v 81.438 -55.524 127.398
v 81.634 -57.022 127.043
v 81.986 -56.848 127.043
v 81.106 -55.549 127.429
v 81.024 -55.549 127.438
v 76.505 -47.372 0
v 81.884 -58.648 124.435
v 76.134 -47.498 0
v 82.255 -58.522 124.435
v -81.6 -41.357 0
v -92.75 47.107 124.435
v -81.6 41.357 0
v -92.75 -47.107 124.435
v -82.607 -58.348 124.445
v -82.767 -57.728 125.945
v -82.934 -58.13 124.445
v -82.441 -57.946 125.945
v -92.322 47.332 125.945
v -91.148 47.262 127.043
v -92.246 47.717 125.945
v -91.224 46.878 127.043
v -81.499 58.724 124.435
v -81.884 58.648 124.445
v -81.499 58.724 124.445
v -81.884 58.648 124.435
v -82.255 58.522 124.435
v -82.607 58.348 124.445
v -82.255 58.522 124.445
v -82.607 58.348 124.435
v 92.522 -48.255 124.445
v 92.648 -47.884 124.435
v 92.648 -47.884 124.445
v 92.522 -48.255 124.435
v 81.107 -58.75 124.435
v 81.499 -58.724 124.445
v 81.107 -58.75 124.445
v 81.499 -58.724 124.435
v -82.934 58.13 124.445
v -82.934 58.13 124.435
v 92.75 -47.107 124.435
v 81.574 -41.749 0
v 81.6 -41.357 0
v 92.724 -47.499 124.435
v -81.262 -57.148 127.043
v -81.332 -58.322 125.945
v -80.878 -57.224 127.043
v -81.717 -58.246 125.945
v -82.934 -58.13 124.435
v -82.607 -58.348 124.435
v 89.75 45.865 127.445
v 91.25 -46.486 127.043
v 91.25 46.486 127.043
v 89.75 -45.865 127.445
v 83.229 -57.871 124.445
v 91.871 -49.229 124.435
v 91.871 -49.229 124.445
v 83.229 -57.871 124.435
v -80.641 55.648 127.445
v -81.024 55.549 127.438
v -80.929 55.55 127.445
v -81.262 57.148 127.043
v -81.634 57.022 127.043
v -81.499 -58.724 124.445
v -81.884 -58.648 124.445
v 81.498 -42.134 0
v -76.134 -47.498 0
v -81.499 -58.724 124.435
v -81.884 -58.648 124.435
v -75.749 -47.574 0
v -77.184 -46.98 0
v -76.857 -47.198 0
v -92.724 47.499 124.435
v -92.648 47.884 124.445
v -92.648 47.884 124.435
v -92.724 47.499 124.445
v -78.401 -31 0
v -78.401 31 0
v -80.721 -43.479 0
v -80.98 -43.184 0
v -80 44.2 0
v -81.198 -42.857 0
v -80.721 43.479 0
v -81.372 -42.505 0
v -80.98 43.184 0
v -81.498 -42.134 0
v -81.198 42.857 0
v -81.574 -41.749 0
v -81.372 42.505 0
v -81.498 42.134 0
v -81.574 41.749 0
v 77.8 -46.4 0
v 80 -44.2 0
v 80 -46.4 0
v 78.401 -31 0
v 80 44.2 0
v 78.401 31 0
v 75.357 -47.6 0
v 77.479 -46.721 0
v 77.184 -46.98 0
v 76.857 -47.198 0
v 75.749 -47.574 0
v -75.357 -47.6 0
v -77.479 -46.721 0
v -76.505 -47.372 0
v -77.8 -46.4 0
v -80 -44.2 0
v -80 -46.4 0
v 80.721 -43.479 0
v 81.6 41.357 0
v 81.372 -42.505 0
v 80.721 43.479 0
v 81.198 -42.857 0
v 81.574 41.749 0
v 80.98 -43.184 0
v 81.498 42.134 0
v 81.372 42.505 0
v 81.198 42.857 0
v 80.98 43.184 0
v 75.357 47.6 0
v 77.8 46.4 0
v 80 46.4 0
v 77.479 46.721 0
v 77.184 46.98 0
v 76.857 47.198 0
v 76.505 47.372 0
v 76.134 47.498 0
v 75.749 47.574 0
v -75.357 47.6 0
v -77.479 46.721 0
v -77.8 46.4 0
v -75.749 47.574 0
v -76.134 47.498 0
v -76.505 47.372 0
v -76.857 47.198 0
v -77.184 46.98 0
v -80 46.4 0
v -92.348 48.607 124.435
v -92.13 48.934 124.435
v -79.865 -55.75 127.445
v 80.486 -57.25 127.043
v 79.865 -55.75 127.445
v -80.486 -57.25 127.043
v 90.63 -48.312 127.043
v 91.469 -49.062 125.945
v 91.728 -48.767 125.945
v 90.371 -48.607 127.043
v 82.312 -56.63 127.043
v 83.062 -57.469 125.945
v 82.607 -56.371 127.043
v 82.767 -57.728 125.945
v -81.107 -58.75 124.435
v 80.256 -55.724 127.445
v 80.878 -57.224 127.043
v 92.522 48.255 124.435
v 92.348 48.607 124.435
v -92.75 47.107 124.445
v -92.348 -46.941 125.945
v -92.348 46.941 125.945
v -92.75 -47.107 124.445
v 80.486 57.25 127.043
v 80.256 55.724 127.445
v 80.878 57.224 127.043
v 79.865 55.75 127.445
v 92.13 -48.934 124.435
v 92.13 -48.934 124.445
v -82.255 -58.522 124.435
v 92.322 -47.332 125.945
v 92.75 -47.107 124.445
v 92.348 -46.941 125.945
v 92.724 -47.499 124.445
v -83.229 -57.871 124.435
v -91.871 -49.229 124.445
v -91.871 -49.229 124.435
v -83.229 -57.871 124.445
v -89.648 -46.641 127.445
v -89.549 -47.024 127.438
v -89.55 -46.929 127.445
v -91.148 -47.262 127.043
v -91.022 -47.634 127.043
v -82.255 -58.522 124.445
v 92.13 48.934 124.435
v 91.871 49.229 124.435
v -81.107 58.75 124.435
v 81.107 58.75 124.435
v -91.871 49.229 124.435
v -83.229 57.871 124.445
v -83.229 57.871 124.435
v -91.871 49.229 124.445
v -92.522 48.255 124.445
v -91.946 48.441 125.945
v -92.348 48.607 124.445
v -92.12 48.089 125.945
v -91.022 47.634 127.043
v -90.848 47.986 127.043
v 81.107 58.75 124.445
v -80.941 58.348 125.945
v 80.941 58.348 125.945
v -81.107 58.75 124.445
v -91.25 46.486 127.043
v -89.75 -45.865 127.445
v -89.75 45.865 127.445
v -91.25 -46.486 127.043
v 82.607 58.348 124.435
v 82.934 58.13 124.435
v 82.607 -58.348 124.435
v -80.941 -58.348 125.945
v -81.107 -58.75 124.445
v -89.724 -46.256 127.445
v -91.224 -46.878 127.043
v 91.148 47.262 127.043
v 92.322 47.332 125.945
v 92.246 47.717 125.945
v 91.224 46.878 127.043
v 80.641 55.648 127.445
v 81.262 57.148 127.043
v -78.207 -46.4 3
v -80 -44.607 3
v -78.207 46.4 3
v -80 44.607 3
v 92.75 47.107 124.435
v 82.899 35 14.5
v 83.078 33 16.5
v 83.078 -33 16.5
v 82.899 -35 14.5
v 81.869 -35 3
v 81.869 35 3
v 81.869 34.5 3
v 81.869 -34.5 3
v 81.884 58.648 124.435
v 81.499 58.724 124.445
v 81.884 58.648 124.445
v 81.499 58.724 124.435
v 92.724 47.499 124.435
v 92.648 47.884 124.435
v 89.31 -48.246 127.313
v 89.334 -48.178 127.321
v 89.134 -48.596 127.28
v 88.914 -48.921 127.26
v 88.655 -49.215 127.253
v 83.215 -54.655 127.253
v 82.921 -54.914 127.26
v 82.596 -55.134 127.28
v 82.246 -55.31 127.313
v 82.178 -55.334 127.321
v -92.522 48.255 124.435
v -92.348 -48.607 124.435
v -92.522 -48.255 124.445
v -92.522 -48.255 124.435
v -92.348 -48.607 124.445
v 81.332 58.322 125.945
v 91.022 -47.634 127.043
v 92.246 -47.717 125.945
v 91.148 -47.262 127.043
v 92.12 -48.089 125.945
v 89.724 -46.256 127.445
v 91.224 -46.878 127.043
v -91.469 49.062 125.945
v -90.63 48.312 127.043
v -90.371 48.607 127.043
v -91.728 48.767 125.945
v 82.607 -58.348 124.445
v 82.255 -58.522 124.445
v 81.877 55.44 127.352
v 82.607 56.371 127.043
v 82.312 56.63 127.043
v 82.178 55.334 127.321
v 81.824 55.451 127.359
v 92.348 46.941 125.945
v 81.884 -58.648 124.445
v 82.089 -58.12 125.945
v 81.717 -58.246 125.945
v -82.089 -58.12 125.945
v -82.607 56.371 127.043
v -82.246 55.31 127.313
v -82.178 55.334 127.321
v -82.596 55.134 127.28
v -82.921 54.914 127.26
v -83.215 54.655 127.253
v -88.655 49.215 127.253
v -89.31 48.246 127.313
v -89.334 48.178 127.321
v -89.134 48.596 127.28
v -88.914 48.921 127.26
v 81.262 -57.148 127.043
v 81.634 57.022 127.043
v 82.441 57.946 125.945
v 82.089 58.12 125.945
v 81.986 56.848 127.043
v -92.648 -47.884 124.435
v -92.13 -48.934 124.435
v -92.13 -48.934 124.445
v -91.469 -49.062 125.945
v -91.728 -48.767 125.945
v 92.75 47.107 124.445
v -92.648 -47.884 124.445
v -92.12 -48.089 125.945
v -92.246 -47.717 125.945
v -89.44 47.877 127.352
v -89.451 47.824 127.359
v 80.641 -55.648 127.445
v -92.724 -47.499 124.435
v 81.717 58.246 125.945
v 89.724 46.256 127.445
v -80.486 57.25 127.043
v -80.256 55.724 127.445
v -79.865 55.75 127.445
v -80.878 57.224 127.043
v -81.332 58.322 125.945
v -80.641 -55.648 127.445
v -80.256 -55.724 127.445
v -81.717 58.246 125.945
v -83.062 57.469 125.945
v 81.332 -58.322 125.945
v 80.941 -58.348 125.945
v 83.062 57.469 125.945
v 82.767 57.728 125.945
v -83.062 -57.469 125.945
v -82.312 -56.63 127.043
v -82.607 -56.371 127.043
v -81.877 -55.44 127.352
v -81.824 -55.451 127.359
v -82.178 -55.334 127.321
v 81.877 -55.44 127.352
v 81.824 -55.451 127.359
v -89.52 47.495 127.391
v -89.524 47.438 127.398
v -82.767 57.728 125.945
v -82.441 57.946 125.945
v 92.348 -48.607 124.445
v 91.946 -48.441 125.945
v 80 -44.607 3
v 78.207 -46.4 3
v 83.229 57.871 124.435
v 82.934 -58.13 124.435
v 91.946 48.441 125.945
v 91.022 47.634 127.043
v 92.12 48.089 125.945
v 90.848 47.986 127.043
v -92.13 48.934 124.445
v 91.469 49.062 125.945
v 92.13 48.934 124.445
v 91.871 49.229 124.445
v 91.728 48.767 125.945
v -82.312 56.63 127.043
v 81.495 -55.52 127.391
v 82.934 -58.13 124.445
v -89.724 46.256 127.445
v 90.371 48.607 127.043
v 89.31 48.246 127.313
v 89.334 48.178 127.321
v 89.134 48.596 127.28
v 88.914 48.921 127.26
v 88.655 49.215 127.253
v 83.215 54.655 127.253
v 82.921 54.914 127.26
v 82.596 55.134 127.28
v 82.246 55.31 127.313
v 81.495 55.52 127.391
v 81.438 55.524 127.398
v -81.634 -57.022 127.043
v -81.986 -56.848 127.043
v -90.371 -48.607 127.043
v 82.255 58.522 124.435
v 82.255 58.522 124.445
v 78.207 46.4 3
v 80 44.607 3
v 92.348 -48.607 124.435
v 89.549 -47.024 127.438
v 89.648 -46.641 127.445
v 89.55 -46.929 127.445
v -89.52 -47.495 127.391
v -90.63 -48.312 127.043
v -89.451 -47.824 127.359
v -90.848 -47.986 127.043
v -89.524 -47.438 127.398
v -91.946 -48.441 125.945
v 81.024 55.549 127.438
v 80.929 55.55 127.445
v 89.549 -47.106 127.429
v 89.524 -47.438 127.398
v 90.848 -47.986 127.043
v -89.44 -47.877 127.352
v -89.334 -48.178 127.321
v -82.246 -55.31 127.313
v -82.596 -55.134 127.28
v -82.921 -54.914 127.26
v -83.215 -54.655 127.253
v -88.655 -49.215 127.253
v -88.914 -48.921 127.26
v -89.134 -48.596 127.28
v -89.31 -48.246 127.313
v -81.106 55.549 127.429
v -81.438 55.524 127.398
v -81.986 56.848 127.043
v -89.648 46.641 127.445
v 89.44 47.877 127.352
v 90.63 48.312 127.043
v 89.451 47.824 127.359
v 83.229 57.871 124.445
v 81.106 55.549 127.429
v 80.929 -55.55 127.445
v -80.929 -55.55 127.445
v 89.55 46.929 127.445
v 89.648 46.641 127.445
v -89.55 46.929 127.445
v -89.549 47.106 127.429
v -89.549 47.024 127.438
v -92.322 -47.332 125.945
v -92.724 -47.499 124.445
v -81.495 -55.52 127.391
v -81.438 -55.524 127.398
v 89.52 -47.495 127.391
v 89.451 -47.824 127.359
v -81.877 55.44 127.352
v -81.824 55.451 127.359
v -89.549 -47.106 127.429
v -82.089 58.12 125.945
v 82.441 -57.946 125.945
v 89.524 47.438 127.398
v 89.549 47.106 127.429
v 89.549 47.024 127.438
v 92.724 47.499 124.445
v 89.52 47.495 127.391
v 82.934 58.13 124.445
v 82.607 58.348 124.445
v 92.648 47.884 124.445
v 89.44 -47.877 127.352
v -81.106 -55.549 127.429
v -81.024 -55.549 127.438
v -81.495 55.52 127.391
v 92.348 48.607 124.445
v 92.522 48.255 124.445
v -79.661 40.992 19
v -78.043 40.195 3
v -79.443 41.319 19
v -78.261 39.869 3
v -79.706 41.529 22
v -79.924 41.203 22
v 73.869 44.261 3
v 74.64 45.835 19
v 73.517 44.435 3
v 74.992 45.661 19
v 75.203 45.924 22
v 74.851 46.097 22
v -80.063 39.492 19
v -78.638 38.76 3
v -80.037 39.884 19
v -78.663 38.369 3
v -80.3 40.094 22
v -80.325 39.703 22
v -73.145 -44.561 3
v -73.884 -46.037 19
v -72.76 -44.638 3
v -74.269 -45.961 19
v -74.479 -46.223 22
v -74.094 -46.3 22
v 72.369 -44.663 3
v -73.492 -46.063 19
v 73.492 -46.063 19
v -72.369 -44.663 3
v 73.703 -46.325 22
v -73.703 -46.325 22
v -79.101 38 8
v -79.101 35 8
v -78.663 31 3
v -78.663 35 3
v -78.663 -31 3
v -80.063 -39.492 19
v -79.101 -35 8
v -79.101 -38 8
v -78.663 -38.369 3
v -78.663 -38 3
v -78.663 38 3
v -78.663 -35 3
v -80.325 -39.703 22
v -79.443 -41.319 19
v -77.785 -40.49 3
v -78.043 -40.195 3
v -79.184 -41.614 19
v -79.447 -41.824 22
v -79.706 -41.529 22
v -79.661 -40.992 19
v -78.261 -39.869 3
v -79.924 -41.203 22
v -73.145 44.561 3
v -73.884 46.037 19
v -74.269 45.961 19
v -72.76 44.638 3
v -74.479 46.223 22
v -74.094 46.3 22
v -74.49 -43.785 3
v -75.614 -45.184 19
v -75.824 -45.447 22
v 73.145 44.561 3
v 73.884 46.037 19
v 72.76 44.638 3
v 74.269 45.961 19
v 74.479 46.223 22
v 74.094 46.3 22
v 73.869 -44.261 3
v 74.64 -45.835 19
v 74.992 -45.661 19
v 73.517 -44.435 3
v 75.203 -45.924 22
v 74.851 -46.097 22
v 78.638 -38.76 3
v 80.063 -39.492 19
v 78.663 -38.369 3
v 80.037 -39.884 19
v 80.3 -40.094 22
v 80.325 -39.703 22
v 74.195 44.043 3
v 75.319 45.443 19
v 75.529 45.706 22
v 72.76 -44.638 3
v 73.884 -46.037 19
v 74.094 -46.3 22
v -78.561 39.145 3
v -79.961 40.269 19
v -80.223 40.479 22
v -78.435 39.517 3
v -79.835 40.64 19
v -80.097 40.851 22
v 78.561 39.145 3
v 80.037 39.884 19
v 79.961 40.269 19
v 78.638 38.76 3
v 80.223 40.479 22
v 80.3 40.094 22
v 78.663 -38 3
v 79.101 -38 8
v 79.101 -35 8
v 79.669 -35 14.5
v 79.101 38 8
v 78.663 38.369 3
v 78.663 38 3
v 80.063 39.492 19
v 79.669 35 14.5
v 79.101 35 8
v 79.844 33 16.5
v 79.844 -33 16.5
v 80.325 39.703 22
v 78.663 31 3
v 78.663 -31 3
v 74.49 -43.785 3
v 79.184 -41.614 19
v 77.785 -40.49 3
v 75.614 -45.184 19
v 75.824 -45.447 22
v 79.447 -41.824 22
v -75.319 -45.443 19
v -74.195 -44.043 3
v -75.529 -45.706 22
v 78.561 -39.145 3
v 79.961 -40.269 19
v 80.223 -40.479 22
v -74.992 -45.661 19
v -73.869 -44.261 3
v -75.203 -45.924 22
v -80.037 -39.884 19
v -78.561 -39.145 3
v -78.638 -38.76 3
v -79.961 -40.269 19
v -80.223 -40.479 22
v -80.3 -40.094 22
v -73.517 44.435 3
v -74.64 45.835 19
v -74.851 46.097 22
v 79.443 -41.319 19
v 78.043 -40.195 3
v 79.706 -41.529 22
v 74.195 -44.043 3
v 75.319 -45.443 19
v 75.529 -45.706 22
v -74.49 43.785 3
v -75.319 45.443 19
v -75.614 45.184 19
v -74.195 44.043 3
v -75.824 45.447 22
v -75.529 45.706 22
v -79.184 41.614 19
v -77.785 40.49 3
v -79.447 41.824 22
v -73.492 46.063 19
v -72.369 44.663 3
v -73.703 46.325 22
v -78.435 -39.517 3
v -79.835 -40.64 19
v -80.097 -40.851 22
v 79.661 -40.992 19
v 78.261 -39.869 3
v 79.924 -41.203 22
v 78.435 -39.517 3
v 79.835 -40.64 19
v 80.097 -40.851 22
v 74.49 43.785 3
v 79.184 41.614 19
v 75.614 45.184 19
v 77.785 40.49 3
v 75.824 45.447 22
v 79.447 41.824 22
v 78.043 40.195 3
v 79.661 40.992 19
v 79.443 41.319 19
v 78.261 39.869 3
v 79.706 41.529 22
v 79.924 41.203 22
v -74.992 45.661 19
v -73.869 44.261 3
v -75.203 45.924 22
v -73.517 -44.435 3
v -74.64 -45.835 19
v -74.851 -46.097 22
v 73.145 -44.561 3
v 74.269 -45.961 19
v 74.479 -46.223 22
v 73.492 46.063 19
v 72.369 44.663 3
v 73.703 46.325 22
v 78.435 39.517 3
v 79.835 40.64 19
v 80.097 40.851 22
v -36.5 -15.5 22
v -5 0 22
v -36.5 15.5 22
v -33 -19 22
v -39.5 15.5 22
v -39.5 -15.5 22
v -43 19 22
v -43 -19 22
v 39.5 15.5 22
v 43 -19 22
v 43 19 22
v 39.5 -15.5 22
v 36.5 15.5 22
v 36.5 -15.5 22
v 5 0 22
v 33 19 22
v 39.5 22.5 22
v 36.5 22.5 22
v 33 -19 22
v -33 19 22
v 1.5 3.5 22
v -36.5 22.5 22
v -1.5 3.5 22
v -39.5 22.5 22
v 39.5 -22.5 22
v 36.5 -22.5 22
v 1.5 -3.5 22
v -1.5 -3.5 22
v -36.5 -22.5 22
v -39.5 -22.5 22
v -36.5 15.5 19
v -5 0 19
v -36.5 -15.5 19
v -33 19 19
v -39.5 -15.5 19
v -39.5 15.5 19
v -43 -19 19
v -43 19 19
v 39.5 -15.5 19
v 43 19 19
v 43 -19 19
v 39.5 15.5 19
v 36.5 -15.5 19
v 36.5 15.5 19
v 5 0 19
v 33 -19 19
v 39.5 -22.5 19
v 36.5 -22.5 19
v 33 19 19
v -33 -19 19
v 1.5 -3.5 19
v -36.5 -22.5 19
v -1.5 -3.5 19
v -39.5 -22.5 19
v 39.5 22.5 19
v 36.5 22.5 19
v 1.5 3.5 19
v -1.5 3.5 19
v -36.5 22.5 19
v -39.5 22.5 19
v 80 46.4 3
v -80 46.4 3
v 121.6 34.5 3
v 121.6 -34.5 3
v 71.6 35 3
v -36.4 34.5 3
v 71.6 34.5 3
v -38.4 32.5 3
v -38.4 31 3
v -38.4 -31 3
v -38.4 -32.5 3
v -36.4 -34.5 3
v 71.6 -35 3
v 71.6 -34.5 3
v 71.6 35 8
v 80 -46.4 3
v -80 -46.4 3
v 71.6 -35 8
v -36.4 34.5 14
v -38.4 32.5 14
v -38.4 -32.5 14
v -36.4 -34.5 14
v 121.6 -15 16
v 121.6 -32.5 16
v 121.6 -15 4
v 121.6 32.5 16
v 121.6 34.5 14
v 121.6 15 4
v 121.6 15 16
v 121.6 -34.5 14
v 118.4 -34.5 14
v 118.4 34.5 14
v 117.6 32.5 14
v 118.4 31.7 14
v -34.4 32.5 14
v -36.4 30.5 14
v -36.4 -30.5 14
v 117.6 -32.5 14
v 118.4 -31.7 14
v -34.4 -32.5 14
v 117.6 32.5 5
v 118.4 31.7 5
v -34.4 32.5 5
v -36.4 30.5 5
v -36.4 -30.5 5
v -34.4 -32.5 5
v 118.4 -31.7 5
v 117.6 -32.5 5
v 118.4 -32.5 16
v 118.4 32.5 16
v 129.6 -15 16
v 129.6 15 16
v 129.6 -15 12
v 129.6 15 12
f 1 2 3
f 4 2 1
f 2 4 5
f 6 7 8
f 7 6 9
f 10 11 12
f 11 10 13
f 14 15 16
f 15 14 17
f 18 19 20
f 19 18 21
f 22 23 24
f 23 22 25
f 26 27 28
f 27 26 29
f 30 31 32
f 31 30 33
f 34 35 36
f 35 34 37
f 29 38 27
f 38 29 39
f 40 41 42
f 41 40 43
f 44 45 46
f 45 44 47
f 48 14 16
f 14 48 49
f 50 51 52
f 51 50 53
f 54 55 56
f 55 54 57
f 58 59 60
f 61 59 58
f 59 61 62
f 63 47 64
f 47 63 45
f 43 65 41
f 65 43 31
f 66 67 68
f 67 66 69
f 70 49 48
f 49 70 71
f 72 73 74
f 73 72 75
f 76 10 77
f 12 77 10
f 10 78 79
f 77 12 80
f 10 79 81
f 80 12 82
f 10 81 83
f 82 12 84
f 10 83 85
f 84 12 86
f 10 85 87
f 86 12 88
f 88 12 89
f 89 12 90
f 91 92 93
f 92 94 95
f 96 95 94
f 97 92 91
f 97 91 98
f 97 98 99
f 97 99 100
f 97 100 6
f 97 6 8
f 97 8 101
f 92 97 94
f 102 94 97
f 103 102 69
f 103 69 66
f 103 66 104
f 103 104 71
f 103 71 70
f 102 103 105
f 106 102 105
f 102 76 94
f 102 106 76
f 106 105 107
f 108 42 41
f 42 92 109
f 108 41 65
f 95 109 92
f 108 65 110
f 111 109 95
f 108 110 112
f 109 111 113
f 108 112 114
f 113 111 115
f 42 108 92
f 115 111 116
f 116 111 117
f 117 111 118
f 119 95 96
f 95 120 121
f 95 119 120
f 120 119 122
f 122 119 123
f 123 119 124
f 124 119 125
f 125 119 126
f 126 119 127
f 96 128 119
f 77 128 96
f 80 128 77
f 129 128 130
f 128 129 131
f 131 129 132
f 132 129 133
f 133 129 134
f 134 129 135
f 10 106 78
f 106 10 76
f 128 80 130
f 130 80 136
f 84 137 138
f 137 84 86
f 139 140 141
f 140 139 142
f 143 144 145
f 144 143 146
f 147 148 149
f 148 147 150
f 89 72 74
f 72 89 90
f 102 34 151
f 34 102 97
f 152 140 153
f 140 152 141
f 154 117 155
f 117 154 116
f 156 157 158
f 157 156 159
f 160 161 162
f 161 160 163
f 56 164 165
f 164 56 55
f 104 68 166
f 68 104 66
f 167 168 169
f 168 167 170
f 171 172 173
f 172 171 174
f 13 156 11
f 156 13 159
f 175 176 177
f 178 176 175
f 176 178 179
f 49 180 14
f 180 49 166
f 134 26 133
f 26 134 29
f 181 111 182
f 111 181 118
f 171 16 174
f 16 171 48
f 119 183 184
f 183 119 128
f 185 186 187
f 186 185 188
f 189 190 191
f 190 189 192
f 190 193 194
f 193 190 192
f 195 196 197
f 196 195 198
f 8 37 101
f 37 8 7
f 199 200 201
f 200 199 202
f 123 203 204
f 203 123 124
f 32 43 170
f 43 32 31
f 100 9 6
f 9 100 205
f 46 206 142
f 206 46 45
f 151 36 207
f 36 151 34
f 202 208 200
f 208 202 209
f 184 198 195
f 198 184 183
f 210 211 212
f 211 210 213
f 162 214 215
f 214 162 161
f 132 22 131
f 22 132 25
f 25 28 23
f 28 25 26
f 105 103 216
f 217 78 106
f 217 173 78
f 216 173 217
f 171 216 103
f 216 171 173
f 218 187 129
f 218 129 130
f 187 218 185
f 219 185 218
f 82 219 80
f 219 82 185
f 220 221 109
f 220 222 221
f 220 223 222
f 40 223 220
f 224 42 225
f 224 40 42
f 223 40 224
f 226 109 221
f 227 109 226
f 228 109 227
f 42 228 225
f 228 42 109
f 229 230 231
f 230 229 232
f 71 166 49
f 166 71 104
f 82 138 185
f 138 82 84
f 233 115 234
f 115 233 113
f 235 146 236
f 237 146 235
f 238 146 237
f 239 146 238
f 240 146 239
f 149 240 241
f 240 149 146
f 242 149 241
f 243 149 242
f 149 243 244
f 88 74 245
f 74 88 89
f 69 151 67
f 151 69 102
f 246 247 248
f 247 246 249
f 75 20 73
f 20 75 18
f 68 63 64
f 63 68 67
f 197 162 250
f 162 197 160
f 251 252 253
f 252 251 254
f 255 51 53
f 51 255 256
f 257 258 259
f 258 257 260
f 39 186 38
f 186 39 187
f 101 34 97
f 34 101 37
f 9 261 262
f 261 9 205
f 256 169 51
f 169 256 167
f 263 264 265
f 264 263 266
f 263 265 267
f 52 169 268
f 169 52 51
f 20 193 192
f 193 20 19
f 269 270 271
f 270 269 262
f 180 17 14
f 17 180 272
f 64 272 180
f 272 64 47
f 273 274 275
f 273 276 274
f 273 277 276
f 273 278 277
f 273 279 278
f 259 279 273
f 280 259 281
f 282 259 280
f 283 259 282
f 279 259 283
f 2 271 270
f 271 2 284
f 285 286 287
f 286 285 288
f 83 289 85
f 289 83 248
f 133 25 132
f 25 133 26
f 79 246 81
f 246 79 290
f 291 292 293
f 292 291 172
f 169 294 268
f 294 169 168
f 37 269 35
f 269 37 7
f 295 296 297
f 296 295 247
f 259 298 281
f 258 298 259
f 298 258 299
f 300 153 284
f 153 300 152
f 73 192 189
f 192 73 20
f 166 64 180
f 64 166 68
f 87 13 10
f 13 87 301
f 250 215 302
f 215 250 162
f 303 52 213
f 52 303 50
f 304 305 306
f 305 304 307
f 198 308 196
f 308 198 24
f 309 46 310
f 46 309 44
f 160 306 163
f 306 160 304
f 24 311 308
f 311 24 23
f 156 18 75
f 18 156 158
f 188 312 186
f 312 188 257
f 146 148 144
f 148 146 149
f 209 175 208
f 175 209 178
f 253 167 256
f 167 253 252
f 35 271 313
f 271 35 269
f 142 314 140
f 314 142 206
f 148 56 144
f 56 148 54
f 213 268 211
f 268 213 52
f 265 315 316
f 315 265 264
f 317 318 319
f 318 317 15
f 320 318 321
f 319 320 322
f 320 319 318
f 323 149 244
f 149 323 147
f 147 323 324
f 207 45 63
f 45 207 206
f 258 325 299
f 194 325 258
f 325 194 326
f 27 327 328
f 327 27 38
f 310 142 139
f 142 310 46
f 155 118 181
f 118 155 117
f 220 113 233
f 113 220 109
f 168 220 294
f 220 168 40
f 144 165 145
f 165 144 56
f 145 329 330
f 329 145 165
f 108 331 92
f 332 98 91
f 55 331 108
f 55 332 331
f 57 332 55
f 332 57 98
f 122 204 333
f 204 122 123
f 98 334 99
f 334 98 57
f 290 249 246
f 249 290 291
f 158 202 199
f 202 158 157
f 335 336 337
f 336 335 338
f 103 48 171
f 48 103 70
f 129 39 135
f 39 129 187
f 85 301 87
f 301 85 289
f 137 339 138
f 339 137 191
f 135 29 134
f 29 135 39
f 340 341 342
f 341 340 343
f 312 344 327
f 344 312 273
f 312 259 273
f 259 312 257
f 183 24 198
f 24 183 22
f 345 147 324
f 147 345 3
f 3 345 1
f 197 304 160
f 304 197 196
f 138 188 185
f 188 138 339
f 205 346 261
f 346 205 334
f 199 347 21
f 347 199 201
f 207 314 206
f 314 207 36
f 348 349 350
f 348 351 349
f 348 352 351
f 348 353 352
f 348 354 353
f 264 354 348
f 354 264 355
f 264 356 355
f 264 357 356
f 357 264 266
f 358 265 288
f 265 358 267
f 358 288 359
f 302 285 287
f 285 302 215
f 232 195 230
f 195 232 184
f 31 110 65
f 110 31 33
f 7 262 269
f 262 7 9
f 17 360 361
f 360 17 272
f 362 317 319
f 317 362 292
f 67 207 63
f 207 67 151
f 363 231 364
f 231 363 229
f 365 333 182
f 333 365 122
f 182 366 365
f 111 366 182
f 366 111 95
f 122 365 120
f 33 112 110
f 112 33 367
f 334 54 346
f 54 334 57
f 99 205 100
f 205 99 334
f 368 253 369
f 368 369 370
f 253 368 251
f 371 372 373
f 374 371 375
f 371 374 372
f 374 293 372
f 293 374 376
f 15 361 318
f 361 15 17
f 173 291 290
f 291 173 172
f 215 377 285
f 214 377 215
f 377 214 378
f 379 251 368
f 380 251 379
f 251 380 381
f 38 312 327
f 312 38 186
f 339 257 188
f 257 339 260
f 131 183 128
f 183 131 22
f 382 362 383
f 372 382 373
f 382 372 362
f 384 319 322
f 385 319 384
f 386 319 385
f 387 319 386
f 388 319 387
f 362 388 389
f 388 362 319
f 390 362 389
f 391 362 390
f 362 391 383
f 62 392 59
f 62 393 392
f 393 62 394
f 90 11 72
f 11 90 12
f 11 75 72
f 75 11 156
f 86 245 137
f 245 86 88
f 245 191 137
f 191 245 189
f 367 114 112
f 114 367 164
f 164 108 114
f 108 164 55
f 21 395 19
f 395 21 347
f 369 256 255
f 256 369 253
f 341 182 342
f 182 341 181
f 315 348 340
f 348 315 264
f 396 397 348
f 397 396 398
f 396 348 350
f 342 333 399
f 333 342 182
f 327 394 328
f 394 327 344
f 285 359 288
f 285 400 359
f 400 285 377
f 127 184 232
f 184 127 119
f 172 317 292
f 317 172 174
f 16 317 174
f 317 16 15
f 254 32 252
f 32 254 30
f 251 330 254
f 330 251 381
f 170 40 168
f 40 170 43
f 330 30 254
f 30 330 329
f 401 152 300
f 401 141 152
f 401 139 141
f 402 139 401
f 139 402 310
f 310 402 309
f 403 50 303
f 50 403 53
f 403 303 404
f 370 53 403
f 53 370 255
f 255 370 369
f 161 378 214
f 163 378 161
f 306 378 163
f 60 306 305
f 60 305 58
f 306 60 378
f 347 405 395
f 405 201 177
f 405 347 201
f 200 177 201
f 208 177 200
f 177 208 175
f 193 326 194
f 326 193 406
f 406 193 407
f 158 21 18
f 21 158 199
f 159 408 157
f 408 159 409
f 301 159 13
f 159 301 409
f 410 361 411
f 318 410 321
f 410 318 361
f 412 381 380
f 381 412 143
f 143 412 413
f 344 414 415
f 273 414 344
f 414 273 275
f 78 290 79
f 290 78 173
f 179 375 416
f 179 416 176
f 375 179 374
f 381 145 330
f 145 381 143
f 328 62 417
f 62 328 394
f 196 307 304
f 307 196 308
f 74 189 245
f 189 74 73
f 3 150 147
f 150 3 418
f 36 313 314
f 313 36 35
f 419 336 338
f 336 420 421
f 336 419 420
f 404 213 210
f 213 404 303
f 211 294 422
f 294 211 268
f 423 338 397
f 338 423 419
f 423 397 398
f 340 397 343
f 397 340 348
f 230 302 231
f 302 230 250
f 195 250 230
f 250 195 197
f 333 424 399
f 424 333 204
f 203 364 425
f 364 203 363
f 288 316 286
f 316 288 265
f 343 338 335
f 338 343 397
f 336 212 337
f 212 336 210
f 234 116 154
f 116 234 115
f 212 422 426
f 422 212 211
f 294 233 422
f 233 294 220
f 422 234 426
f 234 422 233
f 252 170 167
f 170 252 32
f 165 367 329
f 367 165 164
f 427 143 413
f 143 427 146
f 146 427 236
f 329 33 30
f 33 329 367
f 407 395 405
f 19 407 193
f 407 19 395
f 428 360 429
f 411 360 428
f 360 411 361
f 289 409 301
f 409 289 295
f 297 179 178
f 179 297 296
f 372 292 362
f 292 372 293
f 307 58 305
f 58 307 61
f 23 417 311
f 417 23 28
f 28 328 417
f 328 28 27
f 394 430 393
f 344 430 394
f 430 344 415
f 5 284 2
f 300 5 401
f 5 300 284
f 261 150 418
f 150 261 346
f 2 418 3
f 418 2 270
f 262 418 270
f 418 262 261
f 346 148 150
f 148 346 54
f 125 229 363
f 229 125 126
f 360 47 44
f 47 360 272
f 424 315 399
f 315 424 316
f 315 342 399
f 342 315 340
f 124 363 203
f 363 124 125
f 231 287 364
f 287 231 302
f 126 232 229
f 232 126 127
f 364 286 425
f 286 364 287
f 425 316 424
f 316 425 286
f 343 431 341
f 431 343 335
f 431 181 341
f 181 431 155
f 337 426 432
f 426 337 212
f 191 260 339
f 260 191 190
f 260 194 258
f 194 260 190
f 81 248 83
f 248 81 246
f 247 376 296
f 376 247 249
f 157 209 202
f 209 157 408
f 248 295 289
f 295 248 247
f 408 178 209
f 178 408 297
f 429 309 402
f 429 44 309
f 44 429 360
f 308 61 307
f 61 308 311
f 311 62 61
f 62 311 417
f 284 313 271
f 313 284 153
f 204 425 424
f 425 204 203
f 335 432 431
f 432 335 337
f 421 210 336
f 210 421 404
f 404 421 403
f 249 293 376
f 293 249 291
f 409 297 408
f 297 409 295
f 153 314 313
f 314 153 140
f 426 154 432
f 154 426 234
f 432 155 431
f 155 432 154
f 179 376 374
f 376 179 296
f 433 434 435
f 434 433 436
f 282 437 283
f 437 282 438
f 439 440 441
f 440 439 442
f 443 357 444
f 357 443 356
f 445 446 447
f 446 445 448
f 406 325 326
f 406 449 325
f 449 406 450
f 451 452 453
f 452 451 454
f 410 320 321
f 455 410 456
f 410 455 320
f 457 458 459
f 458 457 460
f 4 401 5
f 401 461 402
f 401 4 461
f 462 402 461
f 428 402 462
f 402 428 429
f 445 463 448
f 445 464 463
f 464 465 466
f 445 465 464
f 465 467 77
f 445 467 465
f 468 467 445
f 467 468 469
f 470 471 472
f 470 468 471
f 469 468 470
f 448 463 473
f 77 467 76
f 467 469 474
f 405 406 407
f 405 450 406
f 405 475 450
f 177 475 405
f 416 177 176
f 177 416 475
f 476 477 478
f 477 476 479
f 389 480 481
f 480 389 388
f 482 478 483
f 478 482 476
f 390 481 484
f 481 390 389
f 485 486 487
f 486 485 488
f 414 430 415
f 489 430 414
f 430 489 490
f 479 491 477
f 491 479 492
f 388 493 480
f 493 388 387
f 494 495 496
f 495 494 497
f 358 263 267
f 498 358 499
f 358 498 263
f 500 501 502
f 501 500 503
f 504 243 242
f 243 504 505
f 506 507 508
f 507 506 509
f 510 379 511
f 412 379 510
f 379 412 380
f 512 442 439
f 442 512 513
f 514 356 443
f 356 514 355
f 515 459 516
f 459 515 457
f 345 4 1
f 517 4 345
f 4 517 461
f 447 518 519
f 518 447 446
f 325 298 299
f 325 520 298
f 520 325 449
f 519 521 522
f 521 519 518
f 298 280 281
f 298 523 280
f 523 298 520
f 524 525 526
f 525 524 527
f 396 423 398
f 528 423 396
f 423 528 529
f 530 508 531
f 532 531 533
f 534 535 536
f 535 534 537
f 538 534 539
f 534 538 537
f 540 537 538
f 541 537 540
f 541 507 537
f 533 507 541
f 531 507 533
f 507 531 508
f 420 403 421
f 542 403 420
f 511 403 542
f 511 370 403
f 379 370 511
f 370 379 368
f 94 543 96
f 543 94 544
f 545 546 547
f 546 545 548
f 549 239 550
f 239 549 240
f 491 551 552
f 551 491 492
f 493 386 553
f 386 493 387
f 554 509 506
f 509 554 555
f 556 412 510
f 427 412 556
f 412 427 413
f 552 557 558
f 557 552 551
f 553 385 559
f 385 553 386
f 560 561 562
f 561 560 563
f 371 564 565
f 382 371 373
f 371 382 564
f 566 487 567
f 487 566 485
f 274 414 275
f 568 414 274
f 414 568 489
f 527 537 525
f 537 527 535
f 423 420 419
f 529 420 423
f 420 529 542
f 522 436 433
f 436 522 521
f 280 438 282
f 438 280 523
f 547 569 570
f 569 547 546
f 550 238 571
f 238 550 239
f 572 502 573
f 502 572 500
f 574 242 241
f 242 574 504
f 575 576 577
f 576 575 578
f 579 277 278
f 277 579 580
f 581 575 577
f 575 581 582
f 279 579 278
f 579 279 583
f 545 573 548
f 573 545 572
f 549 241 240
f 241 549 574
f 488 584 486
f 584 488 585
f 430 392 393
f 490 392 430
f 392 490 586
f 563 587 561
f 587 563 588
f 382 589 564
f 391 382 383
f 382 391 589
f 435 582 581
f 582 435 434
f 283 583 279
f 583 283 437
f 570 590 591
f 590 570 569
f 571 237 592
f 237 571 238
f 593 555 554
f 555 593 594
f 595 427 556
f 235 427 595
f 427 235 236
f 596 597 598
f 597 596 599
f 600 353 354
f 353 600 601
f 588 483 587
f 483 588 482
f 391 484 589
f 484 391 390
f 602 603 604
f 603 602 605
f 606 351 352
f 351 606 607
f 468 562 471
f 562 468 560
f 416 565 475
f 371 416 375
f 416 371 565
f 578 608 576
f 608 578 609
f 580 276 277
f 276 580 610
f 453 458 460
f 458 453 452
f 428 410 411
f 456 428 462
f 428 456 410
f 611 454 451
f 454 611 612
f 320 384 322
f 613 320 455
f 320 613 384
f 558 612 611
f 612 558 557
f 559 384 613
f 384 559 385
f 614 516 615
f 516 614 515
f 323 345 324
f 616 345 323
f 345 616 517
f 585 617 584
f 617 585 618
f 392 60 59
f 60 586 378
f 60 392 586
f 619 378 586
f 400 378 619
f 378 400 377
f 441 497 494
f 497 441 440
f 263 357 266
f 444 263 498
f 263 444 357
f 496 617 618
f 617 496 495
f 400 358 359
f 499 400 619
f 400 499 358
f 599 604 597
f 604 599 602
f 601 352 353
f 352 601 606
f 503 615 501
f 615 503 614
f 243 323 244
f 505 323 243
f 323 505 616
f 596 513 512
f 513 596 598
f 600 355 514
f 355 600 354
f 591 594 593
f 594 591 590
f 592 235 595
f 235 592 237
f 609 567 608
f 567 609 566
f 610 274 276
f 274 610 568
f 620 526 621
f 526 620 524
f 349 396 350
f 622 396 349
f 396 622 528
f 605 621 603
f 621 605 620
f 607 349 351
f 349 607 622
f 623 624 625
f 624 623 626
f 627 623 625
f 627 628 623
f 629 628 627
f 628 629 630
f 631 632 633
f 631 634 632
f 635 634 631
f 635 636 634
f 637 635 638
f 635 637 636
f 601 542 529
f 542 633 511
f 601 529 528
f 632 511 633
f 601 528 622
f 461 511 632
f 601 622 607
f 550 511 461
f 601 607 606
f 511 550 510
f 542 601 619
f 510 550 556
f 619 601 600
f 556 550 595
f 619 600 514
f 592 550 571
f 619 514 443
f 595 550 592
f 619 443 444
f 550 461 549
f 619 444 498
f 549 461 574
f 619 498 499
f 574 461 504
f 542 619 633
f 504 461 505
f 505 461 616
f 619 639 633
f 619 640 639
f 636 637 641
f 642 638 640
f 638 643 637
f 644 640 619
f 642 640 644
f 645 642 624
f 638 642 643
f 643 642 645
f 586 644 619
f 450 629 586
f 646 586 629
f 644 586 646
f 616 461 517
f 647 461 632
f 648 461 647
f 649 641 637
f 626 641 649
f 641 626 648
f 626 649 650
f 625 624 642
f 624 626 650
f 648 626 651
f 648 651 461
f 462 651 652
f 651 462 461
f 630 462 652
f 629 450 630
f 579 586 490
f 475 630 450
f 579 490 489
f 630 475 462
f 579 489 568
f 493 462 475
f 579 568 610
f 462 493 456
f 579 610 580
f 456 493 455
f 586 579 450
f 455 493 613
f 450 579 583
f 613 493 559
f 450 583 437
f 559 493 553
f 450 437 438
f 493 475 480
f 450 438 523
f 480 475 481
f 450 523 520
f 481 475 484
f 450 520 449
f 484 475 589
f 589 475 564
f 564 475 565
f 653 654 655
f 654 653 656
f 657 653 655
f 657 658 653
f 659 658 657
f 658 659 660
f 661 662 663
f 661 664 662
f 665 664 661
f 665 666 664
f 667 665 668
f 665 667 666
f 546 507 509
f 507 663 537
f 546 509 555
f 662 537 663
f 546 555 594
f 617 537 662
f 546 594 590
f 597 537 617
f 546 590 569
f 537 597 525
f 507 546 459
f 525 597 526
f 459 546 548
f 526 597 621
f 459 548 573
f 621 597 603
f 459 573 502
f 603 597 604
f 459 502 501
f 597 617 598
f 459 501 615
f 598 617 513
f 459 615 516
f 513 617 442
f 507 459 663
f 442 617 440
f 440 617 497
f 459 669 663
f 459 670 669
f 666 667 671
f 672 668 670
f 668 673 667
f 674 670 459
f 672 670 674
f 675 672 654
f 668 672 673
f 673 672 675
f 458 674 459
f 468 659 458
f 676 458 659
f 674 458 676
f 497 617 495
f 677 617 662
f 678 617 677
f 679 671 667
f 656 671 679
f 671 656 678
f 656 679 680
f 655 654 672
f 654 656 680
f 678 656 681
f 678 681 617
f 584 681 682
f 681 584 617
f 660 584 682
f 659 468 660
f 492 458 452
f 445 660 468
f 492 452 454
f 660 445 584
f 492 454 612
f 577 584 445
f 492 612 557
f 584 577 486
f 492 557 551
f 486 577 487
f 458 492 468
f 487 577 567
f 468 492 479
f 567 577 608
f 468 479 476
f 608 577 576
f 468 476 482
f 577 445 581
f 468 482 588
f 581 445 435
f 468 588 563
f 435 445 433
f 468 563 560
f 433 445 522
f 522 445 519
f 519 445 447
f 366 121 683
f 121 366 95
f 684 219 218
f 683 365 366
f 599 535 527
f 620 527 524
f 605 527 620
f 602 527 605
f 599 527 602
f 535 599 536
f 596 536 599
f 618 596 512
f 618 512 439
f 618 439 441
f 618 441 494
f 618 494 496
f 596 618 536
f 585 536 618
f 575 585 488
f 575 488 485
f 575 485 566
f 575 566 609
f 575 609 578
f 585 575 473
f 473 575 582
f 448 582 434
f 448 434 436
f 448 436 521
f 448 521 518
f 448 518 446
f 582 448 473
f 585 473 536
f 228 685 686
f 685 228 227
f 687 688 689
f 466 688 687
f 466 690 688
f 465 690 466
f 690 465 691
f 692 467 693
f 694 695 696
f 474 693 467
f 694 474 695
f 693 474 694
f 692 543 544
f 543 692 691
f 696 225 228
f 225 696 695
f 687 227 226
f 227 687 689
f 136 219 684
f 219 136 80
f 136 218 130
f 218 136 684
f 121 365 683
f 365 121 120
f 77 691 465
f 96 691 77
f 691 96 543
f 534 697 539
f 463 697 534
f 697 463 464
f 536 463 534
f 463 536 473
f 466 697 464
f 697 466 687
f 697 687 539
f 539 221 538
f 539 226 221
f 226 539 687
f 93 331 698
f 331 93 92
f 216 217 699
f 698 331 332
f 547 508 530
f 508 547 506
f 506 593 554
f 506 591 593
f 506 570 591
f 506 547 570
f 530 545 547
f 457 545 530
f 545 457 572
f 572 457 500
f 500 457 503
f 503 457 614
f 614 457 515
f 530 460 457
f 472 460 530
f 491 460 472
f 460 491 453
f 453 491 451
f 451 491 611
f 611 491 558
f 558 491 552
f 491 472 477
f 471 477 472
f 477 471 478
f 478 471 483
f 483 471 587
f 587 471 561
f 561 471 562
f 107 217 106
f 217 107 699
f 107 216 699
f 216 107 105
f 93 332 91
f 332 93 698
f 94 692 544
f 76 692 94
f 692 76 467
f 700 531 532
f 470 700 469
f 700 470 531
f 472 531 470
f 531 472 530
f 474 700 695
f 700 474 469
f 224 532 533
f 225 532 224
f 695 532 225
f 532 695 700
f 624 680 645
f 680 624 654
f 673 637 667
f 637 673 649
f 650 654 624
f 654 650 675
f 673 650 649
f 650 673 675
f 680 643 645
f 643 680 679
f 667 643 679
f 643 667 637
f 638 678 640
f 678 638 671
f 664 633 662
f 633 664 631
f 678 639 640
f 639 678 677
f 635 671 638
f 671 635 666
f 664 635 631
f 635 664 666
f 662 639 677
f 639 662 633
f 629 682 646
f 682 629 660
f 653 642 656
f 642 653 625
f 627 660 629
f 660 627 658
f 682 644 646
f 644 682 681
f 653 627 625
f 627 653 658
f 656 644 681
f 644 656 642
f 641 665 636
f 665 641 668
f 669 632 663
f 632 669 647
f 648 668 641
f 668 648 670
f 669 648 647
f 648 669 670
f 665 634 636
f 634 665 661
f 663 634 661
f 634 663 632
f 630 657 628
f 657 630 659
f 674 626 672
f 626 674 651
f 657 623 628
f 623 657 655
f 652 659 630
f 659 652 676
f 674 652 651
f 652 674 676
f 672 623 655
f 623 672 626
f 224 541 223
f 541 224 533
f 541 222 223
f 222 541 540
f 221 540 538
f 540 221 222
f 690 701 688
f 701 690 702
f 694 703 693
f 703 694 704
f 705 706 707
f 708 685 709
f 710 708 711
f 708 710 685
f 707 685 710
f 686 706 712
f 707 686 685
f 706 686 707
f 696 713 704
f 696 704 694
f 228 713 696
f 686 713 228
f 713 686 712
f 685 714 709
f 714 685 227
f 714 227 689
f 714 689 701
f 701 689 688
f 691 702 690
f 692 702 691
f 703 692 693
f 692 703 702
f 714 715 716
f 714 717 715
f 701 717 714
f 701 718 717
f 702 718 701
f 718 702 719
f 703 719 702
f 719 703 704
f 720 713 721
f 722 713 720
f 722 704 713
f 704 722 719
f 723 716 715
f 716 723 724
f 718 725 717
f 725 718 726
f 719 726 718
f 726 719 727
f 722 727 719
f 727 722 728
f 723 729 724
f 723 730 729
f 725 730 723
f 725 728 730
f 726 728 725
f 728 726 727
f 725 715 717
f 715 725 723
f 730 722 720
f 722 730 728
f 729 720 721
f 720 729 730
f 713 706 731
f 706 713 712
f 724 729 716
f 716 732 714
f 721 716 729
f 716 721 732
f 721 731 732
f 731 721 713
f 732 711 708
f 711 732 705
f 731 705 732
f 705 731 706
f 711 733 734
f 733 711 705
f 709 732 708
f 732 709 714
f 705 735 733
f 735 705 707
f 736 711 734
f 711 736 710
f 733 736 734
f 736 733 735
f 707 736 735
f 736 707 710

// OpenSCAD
// Marsh repot liner — rebuilt from "Marsh repot - FIX flat rim setback.step"
// (two-body Fusion export, 2026-07-10) plus the user's section screenshots.
// Dimensions taken from per-body vertex extraction; see comments.
//
// TWO PARTS: set `part` to "pot", "tray", or "all" (assembly preview;
// `pullout` slides the tray out along +X for illustration).
//
// PRINT ORIENTATION (pot): on its BACK face — the +X end wall — rotated
// (90 - draft) about Y so that wall lies flat: 85deg at the current 5deg
// draft. Hanging tension then runs along layer planes [25]. The drawer
// slot lives in that same wall, so in use it faces the wall it hangs on
// and the pot reads as an unbroken solid from the front and sides.
// The tray prints as modelled: flat on the bed, basin up.
//
// v015: the pot HANGS, so the tray can no longer rest on a table — the
//   drawer bay now carries it. Two L-section channel rails run the
//   length of the bay: a shelf (Z0..sill_h) reaching rail_under beneath
//   each tray edge, and an upstand beside each edge that captures the
//   tray laterally (rail_gap per side). The slot bottom is raised onto a
//   solid sill at sill_h — the wall below the slot is solid again, so
//   the skirt ring is continuous (v014 had severed it) and the sill top
//   is the channel floor at the back. Rails and sill print as vertical
//   fins in the face print — no new overhangs. Tray heights trimmed to
//   keep the floor lintel: opening 13.5, face 13, basin rim 11. Slide-
//   out is backstopped in use by the wall the pot hangs against (the
//   pull lip stands the pot ~6mm off it); if it will hang free (ceiling
//   hook), add a detent before printing.
// v014: hex band, struts, and captive drip tray REMOVED. The under-floor
//   bay became a drawer bay: a slot through the back wall accepts a
//   separate pull-out drip tray (basin + face plate + pull lip) under
//   the 5 drainage holes. Visible only from the back. The tray's front
//   edge meeting the far wall is the insertion stop.
// v013: flat-rim setback REMOVED (a deliberate departure from the
//   original Fusion design this file was rebuilt from). The wall runs
//   uniform 3.2mm thickness to the top, capped by a 3mm outer roundover
//   that sweeps to within 0.2mm of the inner face. Print cost: ~1mm
//   under-curl band on the bed-end rim edge only.
// v012: rim outer edge rounded with rim_r = 1 (superseded by v013).
// v011: shell corners softened with the chamfer+fillet combo [10]: the
//   45deg chamfer core stays, its transition edges rounded by
//   corner_rf = 3; ~0.9mm steep band along the two bed-side corner rails.
// v010: pot elongated until every wall is at a 5deg draft. Footprints
//   unchanged; height = 11.15/tan(5) = 127.44.
// v009: side-print audit fixes (hex drainage holes, 3.2mm walls, 45deg
//   shell corner chamfers). Drain hexes kept.
// v008: band-to-tray attachment on struts (removed in v014 with band).
// v007: merged into one body (reverted in v014: two parts again).
// v006: exact geometry from the two-body export. Shell taper is LINEAR
//   rim-to-ground: outer 163.2x95.2 at Z0 to 185.5x117.5 at the rim
//   (skirt ring verts at Z=0: +-81.59 x +-47.59). Skirt is SOLID.
// v005: center tray + windowed ring (architecture right, details wrong).
// v004: 5x 8mm round drainage holes per horticultural guidance, kept
//   (as 10x7 hexes since v009).
// v002/v003: rim setback fix / open-tray rework (superseded).

part    = "all";   // "pot" | "tray" | "all"
pullout = 40;      // assembly preview only: tray drawn out along +X (mm)

$fn = 48;

// --- Shell: linear taper, ground to rim (per-body verts) ---
top_x   = 185.5;
top_y   = 117.5;
bot_x   = 163.2;   // skirt outer at Z=0 (+-81.59)
bot_y   = 95.2;    // (+-47.59)
draft   = 5;       // wall draft, degrees — all four walls
height  = (top_x - bot_x)/2 / tan(draft);   // 127.44 at 5deg
// One height can only set every wall to `draft` because both directions
// share the same half-difference; keep it that way.
assert(abs((top_x - bot_x) - (top_y - bot_y)) < 1e-6,
       "X and Y tapers differ; a single height cannot give one draft");
ch_top  = 10.4;    // 45deg corner chamfer at the rim
ch_bot  = 5;       // corner chamfer at the base
corner_rf = 3;     // fillet on the chamfer transition edges [10]; ~3mm
                   // is the ceiling before the bed-side rails droop
wall    = 3.2;     // 8x a 0.4mm extrusion line [1]

// --- Rim: uniform wall thickness to the top, rounded outer lip ---
rim_r = 3;   // top-edge roundover; on a 3.2 wall this sweeps to within
             // 0.2mm of the inner face (a near-full-width rounded lip)
assert(rim_r <= wall,
       "rim_r > wall: the roundover would undercut the inner face");

// --- Pot floor (STEP: bottom face Z=19, top ~22) ---
floor_bot = 19;
floor_top = 22;

// Drainage: 5 holes (v004 horticultural spec), hexagonal for the face
// print — pointed along pot-X so the points face print-vertical [3,4].
// 10x7 hex ~= 45mm2 open, matching the previous 8mm round hole.
drain_x  = 10;     // point-to-point, along pot-X
drain_y  = 7;      // across, along pot-Y
hole_pos = [[0, 0], [38, 19], [-38, 19], [38, -19], [-38, -19]];

// --- Drawer slot (back wall = +X end wall, the print-bed face) ---
sill_h    = 3;     // solid sill below the slot; its top is the channel
                   // floor at the back, and it keeps the skirt ring whole
slot_open = 13.5;  // opening height above the sill
slot_w    = 70;    // opening width, centered in Y
slot_top  = sill_h + slot_open;   // 16.5
slot_ch   = 2;     // 45deg chamfer on the slot's top corners
tray_clr  = 0.5;   // per-side clearance, slot to tray
assert(slot_top <= floor_bot - 2,
       "slot too tall: keep a solid lintel band below the pot floor");
assert(slot_w/2 <= bot_y/2 - wall - ch_bot,
       "slot_w too wide: slot must stay in the flat of the back wall");

// --- Channel rails: L-section, one per side, full bay length ---
rail_under = 3.5;  // shelf reach beneath each tray edge
rail_lip_t = 3;    // upstand thickness
rail_lip_h = 8;    // upstand height (guides the basin's lower half)
rail_gap   = 0.5;  // lateral clearance, tray edge to upstand

// --- Pull-out drip tray (modelled with its bottom at Z0 = as printed;
//     seated in the pot it rides the channel at Z = sill_h) ---
tray_len   = 160;    // front edge stops 0.26 shy of the far wall when
                     // the face plate is flush with the back at Z0
tray_w     = slot_w - 2*tray_clr;   // 69
tray_wall  = 2;      // basin wall
tray_floor = 2;      // basin floor plate
tray_rim   = 11;     // basin wall height (passes the opening with air)
tray_ch    = 2;      // basin corner chamfer, in plan
face_t     = 3.2;    // face plate thickness (matches pot wall)
face_h     = slot_open - tray_clr;  // 13
lip_w      = 30;     // pull lip: bar across the face plate top,
lip_d      = 8;      //   protruding lip_d out the back,
lip_t      = 4;      //   lip_t thick, 45deg chamfer underneath [print]
assert(tray_rim < slot_open - tray_clr, "basin rim cannot pass the slot");
assert(face_h - lip_t - lip_d >= 0, "lip 45deg root runs off the plate");
assert(sill_h + face_h + tray_clr <= slot_top,
       "face plate taller than the opening above the sill");

back_x = bot_x/2;    // back wall outer plane at Z0 (the flush reference)
// Insertion stop: front edge meets the far wall inner face at sill_h.
assert(back_x - tray_len >= -(bot_x/2 - wall) - sill_h*tan(draft),
       "tray_len too long: front edge starts inside the far wall");

// Rail cross-section, derived from the tray so the fit is definitional:
rail_y_in   = tray_w/2 - rail_under;          // shelf inner edge (31)
rail_lip_in = tray_w/2 + rail_gap;            // upstand inner face (35)
rail_y_weld = bot_y/2 - wall + 2;             // buried into the skirt
rail_x_end  = bot_x/2 - 1.6;                  // buried into both end walls
assert(rail_lip_in >= slot_w/2 - 0.01,
       "upstand faces must not sit inside the slot side walls");

eps = 0.01;

// Chamfered-rectangle corner points, shared by the prism modules.
function cham_pts(x, y, ch) =
    [[-x/2 + ch, -y/2], [x/2 - ch, -y/2], [x/2, -y/2 + ch],
     [x/2,  y/2 - ch], [x/2 - ch,  y/2], [-x/2 + ch,  y/2],
     [-x/2,  y/2 - ch], [-x/2, -y/2 + ch]];

// Rectangle with sharp 45deg chamfered corners, extruded.
module hex_prism(x, y, h, ch) {
    linear_extrude(height = h) polygon(cham_pts(x, y, ch));
}

// Chamfer+fillet combo [10]: chamfered rectangle whose transition edges
// are rounded by rf (shrink, then round-offset back out). `inset`
// additionally shrinks the whole outline by a parallel offset — used to
// build the rim roundover slices.
module soft_prism(x, y, h, ch, rf, inset = 0) {
    linear_extrude(height = h)
        offset(r = rf) offset(delta = -rf - inset)
            polygon(cham_pts(x, y, ch));
}

// Outer shell with a rounded top edge: the hull's top is a stack of
// inset slices tracing a quarter-round of radius rim_r.
module outer_shell() {
    hull() {
        soft_prism(bot_x, bot_y, eps, ch_bot, corner_rf);
        for (t = [0, 30, 60, 90])
            translate([0, 0, height - rim_r + rim_r*sin(t) - eps])
                soft_prism(top_x, top_y, eps, ch_top, corner_rf,
                           inset = rim_r*(1 - cos(t)));
    }
}

// Tapered shell: hull of two soft prisms. The 45deg chamfer core prints
// from any orientation [9]; the rf-rounded transitions soften the look
// while confining >45deg surface to a sub-millimetre band in the face
// print (see the v011 note).
module shell(bx, by, tx, ty, h, cb, ct) {
    hull() {
        soft_prism(bx, by, eps, cb, corner_rf);
        translate([0, 0, h - eps]) soft_prism(tx, ty, eps, ct, corner_rf);
    }
}

// Drainage hexagon: pointed along pot-X (print-vertical when the floor
// prints as a vertical wall), 45deg point slopes, punched along pot-Z.
module drain_hole() {
    hu = drain_x/2; hv = drain_y/2; rise = hv;   // rise = hv -> 45deg
    linear_extrude(height = floor_top - floor_bot + 4, center = true)
        polygon([[-hu, 0], [-hu + rise, hv], [hu - rise, hv],
                 [hu, 0], [hu - rise, -hv], [-hu + rise, -hv]]);
}

function ox(z) = bot_x + (top_x - bot_x) * z / height;
function oy(z) = bot_y + (top_y - bot_y) * z / height;

module cavity() {
    translate([0, 0, -eps])
        shell(bot_x - 2*wall, bot_y - 2*wall,
              top_x - 2*wall, top_y - 2*wall,
              height + 2*eps, ch_bot, max(ch_top - wall, 1));
}

// Slot / face-plate profile in the Y-Z plane: flat bottom at `bot`,
// 45deg chamfers on the top two corners only (the bottom rides the
// sill / channel floor).
function slot_pts(w, h, ch, bot) =
    [[-w/2, bot], [w/2, bot], [w/2, h - ch], [w/2 - ch, h],
     [-w/2 + ch, h], [-w/2, h - ch]];

// Punch the drawer slot along +X through the back wall, from the sill
// top up. The wall leans outward with height (5deg draft), so the
// cutter runs from inside the empty bay to well past the outer face.
module slot_cut() {
    run = 10 + wall + slot_top*tan(draft) + 5;
    translate([back_x - 10, 0, 0])
        rotate([90, 0, 90])
            linear_extrude(height = run)
                polygon(slot_pts(slot_w, slot_top, slot_ch, sill_h));
}

// Channel rails: an L per side — shelf under the tray edge, upstand
// beside it. Both run the full bay length and bury into the skirt side
// walls and both end walls. In the face print these are vertical fins:
// no overhangs.
module rails() {
    for (m = [0, 1]) mirror([0, m, 0]) {
        // Shelf: channel floor, continuous with the sill top.
        translate([-rail_x_end, rail_y_in, 0])
            cube([2*rail_x_end, rail_y_weld - rail_y_in, sill_h]);
        // Upstand: lateral guide, coplanar with the slot side wall.
        translate([-rail_x_end, rail_lip_in, 0])
            cube([2*rail_x_end, rail_lip_t, rail_lip_h]);
    }
}

// Drainage must drip inside the tray basin (checked against the basin's
// inner faces with the tray fully seated).
basin_in_y  = tray_w/2 - tray_wall;
basin_in_x0 = back_x - tray_len + tray_wall;   // front inner face
basin_in_x1 = back_x - face_t;                 // face-plate inner face
function holes_over_tray() =
    [for (p = hole_pos)
        assert(p[0] + drain_x/2 < basin_in_x1,
               str("hole at ", p, " past the tray face plate"))
        assert(p[0] - drain_x/2 > basin_in_x0,
               str("hole at ", p, " past the tray front wall"))
        assert(abs(p[1]) + drain_y/2 < basin_in_y,
               str("hole at ", p, " outside the tray basin in Y"))
        p];

module pot() {
    difference() {
        union() {
            // Shell: solid skirt, ground to rim, linear taper.
            difference() {
                outer_shell();
                cavity();
            }
            // Floor.
            intersection() {
                cavity();
                translate([0, 0, floor_bot])
                    hex_prism(ox(floor_top), oy(floor_top),
                              floor_top - floor_bot, ch_bot);
            }
            // Channel rails for the tray.
            rails();
        }

        // Drainage holes through the floor.
        for (p = holes_over_tray())
            translate([p[0], p[1], (floor_bot + floor_top)/2])
                drain_hole();

        // Drawer slot through the back wall, above the sill.
        slot_cut();
    }
}

// Pull-out drip tray: basin + face plate + pull lip. Modelled with its
// bottom at Z0 (prints as-is, basin up); main() seats it at sill_h.
module tray() {
    xc = back_x - tray_len/2;   // basin center
    union() {
        // Basin: uniform tray_wall walls on a tray_floor plate.
        difference() {
            translate([xc, 0, 0])
                hex_prism(tray_len, tray_w, tray_rim, tray_ch);
            translate([xc, 0, tray_floor])
                hex_prism(tray_len - 2*tray_wall, tray_w - 2*tray_wall,
                          tray_rim, tray_ch);
        }
        // Face plate: fills the slot minus clearance; overlaps the
        // basin's back wall for stiffness.
        translate([back_x - face_t, 0, 0])
            rotate([90, 0, 90])
                linear_extrude(height = face_t)
                    polygon(slot_pts(tray_w, face_h, slot_ch, 0));
        // Pull lip: bar across the face plate top, 45deg underside so
        // the tray prints flat with no supports.
        hull() {
            translate([back_x - eps, -lip_w/2, face_h - lip_t - lip_d])
                cube([eps, lip_w, lip_d + lip_t]);
            translate([back_x - eps, -lip_w/2, face_h - lip_t])
                cube([lip_d + eps, lip_w, lip_t]);
        }
    }
}

module main() {
    if (part == "pot" || part == "all") pot();
    if (part == "tray") tray();
    if (part == "all")
        translate([pullout, 0, sill_h]) tray();   // seated on the channel
}

if (is_list(holes_over_tray())) main();
